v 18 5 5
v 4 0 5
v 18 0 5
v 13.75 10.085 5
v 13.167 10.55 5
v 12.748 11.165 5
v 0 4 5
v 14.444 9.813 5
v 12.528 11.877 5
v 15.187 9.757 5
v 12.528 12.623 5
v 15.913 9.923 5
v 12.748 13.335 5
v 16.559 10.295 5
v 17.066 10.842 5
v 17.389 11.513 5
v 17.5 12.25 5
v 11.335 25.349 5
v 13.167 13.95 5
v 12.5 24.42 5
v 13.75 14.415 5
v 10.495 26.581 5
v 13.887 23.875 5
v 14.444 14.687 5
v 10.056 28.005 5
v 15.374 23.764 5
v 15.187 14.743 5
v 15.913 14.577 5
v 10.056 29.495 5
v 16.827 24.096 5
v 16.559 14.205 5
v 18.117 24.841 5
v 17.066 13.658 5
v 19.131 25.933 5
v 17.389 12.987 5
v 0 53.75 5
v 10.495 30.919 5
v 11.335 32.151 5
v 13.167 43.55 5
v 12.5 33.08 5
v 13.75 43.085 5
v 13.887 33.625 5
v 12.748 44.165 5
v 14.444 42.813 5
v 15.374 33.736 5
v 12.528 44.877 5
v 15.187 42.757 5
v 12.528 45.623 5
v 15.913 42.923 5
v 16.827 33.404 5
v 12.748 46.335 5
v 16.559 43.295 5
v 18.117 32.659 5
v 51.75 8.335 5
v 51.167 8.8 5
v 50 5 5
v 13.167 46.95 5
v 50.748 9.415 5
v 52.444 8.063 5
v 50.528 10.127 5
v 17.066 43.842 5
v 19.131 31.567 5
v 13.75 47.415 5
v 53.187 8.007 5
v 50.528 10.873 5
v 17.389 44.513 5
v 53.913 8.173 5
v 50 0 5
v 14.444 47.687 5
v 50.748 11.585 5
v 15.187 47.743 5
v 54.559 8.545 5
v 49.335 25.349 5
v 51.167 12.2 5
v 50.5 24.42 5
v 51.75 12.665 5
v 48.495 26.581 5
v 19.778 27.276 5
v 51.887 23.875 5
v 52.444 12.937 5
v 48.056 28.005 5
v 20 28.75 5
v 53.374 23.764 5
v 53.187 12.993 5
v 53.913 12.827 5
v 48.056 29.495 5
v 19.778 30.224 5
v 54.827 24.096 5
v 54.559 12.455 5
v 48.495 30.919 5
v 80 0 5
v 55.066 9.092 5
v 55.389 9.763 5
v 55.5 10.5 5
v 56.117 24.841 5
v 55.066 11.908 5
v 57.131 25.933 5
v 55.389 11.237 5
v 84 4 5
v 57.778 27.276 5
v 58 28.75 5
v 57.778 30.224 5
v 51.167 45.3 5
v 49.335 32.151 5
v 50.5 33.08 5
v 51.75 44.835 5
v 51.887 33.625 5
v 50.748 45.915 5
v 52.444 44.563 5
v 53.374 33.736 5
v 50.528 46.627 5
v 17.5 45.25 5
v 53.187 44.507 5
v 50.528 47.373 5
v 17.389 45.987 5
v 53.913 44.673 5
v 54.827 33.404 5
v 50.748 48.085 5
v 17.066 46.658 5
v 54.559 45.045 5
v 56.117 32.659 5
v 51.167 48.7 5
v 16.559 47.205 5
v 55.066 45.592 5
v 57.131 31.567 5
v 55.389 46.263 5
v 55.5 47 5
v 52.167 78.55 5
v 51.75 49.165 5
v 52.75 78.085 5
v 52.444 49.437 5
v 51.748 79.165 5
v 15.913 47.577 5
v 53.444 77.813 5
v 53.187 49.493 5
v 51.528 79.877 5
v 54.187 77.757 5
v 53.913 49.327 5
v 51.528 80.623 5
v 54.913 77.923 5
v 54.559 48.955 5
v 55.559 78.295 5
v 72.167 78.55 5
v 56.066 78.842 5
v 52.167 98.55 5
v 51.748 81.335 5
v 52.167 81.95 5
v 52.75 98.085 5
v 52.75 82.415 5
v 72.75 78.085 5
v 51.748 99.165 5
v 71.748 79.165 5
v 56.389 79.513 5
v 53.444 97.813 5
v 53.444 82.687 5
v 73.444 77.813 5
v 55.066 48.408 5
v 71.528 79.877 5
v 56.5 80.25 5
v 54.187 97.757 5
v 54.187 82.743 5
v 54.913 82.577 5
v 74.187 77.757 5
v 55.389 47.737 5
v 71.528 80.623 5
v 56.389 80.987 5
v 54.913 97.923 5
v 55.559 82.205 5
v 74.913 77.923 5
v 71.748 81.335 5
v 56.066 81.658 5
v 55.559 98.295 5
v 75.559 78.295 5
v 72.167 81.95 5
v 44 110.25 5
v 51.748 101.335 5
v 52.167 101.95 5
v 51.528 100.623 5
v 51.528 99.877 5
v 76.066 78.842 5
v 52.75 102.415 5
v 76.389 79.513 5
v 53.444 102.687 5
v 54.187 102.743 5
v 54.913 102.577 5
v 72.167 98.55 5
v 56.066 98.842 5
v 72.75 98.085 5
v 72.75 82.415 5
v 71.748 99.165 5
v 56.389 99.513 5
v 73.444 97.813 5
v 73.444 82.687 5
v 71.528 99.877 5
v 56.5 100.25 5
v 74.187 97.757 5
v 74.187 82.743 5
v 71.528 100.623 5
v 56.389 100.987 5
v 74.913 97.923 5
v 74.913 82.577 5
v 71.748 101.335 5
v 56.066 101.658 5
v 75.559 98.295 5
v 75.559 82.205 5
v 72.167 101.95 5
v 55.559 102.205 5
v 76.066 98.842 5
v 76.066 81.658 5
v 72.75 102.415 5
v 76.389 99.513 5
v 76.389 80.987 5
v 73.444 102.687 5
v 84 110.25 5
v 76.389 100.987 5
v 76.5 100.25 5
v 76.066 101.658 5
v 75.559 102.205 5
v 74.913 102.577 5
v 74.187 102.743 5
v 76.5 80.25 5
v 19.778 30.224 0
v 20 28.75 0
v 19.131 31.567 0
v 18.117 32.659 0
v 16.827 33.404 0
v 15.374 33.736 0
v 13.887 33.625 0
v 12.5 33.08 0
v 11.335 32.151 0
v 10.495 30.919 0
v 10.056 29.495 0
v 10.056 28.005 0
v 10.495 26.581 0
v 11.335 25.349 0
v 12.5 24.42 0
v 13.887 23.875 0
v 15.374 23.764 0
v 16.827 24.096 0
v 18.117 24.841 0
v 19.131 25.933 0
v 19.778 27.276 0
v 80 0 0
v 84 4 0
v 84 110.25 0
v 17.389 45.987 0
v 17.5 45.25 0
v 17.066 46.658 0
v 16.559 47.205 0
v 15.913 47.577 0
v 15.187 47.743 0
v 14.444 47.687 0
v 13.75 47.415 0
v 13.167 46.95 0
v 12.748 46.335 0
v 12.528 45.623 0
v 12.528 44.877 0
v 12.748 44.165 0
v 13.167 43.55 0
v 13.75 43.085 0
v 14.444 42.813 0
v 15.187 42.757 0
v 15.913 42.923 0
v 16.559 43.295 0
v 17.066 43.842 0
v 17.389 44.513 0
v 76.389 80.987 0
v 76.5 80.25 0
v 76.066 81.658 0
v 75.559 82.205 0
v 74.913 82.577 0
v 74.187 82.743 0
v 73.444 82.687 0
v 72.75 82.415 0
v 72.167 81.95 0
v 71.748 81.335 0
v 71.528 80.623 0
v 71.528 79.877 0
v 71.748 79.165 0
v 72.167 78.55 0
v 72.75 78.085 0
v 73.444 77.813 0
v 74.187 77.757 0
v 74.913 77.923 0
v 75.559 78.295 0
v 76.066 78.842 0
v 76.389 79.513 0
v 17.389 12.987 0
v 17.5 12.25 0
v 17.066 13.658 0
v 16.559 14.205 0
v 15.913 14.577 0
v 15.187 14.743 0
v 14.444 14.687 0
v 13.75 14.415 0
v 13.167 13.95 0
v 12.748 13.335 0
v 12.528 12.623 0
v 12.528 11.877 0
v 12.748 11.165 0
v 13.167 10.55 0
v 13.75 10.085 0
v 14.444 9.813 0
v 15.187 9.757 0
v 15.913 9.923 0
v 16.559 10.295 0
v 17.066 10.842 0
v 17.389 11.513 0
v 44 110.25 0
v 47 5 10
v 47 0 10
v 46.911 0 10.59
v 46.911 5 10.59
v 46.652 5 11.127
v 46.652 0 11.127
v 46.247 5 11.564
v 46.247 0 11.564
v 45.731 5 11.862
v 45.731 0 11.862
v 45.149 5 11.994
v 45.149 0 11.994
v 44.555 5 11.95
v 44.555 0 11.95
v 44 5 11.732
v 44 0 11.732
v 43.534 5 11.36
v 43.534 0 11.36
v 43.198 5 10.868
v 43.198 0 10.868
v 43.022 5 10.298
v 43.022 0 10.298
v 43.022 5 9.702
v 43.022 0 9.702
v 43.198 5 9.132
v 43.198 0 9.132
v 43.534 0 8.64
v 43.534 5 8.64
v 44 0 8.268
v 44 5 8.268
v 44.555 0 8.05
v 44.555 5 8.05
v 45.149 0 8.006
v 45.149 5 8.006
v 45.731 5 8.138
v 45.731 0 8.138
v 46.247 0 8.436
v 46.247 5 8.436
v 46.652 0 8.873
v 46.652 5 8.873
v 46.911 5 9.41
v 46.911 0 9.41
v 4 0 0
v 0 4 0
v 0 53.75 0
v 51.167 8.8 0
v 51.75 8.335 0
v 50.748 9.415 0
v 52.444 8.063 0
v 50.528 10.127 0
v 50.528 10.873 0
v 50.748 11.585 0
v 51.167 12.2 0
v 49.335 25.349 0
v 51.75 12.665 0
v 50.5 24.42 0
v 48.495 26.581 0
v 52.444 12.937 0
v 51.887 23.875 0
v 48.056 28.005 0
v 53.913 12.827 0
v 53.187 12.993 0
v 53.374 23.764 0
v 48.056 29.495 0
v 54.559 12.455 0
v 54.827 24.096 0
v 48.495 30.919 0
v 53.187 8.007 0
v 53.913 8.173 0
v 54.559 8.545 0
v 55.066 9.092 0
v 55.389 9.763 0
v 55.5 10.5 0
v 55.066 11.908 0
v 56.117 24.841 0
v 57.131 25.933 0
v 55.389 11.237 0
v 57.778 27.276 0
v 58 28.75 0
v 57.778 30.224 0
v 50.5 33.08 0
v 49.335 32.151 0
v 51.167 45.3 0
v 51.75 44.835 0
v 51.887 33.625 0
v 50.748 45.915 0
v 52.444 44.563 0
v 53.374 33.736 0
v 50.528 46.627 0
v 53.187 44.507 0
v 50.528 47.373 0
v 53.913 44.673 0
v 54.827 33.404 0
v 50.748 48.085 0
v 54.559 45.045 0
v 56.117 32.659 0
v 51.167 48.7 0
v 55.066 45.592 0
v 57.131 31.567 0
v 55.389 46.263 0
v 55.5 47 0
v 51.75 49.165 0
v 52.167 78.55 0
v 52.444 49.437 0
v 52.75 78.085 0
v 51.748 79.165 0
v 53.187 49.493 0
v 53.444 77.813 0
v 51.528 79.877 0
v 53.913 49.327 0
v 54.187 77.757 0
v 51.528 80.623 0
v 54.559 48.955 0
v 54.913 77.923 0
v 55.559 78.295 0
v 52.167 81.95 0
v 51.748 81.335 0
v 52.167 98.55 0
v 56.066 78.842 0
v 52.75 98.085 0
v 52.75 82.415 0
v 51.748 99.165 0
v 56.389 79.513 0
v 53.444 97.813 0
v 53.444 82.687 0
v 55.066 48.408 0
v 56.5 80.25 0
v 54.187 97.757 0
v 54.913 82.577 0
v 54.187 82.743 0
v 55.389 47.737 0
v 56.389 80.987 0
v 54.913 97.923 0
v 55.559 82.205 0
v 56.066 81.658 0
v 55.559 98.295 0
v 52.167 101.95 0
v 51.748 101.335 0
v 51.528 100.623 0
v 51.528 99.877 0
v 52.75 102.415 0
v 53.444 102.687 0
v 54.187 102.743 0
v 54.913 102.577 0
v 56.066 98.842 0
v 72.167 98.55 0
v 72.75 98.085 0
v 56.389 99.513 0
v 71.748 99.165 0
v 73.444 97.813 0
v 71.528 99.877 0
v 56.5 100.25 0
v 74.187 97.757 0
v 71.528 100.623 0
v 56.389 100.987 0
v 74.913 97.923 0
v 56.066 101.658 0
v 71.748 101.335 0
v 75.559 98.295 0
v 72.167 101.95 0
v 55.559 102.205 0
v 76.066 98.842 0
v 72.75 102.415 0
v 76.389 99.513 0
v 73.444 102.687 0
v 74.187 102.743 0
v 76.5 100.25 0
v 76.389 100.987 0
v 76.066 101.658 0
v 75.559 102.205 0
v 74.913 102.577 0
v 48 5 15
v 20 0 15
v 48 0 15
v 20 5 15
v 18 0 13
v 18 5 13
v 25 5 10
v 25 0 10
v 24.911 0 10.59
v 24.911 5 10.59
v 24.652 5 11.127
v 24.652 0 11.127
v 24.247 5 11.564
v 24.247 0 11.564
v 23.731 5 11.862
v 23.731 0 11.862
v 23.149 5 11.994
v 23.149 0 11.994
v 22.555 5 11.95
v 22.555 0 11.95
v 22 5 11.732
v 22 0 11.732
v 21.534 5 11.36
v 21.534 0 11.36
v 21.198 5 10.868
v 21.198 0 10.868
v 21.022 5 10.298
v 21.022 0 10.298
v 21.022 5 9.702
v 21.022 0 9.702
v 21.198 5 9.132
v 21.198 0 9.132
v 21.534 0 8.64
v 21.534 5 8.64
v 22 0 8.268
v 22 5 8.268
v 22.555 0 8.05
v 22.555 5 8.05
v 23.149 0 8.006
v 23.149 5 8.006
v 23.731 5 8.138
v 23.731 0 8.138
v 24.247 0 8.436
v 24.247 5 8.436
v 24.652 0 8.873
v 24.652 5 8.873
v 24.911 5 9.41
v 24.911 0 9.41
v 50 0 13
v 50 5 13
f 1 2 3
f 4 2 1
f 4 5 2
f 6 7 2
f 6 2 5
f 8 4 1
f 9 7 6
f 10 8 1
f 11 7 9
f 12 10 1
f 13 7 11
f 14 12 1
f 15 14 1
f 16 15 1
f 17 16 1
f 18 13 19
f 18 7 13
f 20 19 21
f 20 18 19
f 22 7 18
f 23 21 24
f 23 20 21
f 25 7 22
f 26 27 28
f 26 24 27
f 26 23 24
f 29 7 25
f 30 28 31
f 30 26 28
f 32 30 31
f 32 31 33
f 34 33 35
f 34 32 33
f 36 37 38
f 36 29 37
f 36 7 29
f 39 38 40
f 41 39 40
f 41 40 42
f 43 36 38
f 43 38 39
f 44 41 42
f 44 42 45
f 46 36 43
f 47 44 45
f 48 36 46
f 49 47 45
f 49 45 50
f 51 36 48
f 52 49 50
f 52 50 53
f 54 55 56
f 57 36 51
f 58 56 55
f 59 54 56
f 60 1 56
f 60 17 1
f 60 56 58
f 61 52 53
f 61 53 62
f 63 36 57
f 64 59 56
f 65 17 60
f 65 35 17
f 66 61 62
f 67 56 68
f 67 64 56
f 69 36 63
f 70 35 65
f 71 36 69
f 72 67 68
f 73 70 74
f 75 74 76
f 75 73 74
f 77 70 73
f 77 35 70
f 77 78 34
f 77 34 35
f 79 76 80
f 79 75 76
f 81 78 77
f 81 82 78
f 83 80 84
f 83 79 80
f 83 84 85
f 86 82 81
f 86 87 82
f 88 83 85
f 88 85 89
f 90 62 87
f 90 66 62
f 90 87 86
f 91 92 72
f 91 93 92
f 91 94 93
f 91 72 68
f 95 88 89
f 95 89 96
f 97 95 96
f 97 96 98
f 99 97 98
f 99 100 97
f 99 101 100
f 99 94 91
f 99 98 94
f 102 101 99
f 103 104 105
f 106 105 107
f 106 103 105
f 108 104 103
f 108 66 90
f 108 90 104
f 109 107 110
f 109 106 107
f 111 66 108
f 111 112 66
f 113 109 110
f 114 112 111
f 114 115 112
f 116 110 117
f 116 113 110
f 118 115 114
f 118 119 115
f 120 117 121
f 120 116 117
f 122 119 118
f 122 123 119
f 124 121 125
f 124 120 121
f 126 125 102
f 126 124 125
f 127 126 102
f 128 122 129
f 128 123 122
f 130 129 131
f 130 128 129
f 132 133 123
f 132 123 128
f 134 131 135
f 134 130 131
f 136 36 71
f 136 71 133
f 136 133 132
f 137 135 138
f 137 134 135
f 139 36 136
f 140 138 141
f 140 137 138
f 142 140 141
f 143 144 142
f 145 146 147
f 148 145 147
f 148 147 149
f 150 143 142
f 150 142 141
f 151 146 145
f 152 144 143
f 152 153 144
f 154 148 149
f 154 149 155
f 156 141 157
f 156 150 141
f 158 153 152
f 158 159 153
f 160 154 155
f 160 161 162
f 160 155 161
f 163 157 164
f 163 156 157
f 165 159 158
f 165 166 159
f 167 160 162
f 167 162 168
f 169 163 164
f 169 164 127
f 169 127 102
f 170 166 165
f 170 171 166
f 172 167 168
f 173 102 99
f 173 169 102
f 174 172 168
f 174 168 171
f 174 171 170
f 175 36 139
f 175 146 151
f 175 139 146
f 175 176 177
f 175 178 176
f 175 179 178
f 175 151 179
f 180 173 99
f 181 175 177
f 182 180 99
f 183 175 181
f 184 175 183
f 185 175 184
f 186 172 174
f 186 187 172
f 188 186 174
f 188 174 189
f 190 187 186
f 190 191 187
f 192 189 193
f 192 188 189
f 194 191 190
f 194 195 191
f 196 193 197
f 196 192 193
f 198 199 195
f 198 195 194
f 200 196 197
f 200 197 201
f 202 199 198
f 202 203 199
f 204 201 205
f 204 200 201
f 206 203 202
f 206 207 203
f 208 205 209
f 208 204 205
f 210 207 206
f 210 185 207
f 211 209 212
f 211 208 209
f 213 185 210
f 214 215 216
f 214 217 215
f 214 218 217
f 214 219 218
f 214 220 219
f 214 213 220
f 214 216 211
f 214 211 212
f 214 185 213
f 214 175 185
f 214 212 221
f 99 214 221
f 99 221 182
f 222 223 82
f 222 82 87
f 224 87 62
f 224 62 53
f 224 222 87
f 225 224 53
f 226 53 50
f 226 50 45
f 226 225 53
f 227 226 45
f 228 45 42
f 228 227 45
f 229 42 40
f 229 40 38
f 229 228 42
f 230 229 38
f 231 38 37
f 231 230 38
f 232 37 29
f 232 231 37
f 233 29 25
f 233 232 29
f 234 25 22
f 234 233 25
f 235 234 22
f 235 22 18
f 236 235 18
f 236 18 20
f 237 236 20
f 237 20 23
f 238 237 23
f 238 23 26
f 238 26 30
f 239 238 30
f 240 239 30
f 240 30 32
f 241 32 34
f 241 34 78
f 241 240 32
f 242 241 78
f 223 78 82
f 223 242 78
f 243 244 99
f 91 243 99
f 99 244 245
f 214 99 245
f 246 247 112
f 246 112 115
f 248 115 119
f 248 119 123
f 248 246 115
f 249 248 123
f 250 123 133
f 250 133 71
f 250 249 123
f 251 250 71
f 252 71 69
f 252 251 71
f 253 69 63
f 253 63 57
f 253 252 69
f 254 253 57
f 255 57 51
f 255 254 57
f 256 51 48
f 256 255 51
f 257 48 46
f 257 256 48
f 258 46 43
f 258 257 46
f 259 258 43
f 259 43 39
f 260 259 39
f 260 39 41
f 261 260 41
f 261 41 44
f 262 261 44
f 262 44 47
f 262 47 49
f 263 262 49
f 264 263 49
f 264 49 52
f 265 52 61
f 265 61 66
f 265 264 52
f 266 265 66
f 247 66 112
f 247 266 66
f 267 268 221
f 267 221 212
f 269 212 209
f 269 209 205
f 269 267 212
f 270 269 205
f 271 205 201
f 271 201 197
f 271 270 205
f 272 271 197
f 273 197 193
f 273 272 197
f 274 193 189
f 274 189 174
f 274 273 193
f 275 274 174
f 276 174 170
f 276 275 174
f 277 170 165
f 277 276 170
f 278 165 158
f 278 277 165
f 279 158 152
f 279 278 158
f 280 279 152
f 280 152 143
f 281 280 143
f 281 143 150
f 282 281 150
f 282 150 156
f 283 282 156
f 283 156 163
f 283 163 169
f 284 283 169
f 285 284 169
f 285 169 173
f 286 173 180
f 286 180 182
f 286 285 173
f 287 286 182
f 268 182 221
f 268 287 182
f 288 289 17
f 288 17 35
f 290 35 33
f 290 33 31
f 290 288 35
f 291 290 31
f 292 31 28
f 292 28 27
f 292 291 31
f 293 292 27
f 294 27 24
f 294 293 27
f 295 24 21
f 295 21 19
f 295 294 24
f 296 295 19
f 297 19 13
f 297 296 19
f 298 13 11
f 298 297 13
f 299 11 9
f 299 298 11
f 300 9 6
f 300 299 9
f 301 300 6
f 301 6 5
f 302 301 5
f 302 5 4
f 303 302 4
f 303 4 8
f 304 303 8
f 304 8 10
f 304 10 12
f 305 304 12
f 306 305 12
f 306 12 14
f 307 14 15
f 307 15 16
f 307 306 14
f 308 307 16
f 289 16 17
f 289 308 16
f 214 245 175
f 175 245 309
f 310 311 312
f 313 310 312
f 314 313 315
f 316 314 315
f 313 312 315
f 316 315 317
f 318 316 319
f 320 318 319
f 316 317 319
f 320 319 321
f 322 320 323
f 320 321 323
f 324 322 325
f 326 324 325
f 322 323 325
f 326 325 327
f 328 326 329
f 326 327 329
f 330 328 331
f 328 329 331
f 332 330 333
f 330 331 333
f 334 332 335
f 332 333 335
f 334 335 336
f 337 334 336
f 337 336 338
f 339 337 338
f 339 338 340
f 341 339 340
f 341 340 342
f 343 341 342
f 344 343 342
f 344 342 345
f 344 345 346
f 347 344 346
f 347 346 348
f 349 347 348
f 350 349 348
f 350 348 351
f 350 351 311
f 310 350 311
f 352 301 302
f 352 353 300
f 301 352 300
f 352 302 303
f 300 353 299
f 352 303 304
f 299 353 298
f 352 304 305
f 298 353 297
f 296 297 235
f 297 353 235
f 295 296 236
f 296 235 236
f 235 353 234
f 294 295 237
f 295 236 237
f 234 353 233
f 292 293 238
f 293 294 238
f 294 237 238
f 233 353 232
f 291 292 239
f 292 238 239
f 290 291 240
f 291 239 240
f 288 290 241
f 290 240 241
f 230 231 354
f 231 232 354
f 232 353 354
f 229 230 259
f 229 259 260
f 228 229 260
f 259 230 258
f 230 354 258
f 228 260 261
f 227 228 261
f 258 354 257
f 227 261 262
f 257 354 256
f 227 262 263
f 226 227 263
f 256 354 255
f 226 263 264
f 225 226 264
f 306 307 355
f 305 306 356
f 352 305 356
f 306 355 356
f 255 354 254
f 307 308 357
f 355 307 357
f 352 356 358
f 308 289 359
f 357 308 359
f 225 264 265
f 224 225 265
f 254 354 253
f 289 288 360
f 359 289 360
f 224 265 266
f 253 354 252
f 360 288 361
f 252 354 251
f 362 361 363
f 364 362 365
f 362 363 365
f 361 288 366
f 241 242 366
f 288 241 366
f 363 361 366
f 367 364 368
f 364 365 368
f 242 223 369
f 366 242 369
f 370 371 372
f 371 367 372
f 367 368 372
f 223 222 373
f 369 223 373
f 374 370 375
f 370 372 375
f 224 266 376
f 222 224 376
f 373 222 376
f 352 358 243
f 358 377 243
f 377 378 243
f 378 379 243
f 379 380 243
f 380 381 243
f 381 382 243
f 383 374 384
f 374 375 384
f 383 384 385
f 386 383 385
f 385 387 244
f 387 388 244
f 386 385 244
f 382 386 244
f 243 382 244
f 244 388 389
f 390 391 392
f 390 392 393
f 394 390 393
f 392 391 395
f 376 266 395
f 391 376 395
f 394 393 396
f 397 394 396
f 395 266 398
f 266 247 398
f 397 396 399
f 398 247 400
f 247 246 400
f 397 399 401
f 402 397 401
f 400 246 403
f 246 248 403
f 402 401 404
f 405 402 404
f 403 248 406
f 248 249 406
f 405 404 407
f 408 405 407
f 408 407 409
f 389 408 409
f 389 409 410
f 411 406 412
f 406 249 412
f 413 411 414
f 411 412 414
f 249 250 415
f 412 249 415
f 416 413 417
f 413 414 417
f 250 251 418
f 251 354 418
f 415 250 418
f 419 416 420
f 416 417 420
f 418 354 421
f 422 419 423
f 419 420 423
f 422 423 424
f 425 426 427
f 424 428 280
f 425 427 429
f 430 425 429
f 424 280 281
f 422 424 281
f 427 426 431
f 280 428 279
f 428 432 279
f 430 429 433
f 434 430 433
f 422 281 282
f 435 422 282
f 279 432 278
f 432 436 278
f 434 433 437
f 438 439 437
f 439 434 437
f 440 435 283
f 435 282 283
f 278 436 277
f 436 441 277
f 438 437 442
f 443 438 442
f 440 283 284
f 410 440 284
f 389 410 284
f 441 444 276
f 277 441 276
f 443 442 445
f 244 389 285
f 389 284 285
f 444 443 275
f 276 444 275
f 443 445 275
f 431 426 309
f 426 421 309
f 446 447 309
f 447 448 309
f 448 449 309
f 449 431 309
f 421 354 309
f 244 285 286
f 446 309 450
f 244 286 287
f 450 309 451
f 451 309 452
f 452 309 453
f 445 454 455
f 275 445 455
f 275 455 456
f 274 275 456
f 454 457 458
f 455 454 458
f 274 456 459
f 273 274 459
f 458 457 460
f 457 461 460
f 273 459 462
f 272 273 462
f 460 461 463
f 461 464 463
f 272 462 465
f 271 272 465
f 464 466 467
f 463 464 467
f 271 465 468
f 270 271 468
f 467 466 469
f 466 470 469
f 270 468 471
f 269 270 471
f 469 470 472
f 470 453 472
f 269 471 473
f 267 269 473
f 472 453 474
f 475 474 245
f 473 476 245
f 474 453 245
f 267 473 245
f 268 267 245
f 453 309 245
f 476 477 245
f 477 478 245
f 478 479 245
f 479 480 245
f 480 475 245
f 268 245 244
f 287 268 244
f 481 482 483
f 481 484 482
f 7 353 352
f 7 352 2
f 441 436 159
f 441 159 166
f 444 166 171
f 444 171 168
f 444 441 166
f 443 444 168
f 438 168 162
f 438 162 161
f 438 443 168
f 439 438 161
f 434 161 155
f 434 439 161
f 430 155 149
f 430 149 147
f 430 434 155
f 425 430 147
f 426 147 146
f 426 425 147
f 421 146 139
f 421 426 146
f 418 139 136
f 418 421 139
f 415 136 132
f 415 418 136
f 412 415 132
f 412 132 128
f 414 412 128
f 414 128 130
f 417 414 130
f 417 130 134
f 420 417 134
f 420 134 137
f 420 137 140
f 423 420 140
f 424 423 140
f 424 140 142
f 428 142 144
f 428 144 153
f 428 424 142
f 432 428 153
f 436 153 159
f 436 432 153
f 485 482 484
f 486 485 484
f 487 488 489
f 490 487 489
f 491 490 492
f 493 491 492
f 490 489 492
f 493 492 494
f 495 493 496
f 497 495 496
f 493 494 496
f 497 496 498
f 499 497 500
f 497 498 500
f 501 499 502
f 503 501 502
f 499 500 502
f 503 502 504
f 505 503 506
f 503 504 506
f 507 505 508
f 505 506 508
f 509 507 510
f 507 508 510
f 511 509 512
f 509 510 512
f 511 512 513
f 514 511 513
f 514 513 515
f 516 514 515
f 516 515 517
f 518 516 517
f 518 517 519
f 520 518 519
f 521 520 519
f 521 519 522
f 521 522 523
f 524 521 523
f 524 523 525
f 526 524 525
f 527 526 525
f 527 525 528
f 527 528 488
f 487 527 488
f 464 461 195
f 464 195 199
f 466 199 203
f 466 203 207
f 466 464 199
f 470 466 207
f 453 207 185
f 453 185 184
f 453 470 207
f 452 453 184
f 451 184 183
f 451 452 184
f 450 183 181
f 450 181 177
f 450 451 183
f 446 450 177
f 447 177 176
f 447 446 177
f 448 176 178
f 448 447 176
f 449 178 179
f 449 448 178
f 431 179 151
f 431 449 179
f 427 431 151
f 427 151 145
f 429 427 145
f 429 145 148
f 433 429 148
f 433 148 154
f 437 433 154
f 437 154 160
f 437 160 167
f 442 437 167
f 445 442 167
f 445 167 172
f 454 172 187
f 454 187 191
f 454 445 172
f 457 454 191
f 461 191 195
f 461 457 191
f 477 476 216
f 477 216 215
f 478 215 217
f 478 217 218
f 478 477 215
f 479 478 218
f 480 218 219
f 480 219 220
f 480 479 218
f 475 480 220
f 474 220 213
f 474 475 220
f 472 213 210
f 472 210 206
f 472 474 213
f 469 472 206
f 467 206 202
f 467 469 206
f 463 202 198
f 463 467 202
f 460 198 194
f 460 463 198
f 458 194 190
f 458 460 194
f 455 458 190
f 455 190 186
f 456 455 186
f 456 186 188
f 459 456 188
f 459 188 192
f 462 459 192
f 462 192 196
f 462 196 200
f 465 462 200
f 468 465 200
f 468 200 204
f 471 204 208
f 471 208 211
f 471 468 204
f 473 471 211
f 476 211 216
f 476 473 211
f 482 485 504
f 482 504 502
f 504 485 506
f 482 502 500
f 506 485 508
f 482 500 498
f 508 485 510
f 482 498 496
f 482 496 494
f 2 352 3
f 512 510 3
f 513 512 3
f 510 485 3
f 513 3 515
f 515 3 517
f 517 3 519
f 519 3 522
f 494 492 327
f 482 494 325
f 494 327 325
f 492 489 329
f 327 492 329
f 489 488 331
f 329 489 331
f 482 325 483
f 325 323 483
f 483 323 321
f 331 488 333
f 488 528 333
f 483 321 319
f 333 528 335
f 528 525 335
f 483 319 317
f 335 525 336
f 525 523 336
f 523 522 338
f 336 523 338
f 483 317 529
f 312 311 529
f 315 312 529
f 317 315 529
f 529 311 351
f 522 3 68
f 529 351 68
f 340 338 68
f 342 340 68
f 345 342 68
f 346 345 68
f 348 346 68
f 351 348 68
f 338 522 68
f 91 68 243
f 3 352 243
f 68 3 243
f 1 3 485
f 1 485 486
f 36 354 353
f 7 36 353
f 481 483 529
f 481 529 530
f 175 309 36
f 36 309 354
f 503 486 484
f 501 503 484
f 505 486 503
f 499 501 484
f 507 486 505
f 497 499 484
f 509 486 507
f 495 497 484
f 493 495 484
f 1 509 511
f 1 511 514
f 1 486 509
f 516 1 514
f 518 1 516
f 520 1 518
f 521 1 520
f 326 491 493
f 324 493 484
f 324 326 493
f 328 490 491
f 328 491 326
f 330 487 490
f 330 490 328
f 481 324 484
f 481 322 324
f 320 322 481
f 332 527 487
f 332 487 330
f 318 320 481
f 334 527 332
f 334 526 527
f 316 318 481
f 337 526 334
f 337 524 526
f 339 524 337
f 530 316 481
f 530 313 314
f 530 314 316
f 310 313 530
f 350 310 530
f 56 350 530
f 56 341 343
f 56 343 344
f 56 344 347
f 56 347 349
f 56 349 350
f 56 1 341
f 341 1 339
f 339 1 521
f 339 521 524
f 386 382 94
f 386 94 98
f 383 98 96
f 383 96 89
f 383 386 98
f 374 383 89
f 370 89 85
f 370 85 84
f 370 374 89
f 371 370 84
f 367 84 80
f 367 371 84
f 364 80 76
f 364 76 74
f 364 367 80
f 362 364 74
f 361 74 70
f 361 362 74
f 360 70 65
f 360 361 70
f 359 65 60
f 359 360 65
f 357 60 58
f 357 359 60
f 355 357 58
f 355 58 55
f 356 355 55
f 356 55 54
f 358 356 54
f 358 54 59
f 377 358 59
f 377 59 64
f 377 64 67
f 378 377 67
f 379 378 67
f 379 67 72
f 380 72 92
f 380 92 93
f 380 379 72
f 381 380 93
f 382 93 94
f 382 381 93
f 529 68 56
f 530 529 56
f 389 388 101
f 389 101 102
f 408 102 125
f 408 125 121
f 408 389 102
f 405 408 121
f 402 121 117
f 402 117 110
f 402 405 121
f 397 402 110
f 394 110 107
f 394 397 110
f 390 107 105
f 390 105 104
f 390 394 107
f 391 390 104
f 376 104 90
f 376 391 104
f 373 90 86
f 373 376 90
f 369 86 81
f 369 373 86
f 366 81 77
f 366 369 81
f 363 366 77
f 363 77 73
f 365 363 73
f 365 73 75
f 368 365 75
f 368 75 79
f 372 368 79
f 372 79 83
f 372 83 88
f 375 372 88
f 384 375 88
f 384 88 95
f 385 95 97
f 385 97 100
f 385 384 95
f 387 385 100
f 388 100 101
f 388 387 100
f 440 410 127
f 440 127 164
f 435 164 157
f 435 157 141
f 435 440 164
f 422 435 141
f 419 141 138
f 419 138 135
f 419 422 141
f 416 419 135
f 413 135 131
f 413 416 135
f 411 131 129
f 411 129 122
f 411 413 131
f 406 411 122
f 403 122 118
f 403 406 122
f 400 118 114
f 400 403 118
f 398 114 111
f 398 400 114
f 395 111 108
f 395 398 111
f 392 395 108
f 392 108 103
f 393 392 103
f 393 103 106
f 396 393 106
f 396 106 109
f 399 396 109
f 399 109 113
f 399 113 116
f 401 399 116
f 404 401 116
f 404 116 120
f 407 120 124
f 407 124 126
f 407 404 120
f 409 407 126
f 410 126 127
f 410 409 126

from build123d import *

# Parameters (mm, degrees)
SKETCH_R        = 2.5
SKETCH_R_2      = 5
PAD_DEPTH       = 5
CHAMFER_SIZE    = 4
SKETCH001_W     = 32
SKETCH001_H     = 5
PAD001_DEPTH    = 10
SKETCH002_R     = 2
POCKET_DEPTH    = 110.251
CHAMFER001_SIZE = 2


with BuildPart() as part:
    # Sketch → Pad (new body)
    with BuildSketch(Plane.XY):
        Polygon((84, 110.25), (44, 110.25), (0, 53.75), (0, 0), (84, 0), align=None)
        with Locations((15, 45.25)):
            Circle(SKETCH_R, mode=Mode.SUBTRACT)
        with Locations((15, 12.25)):
            Circle(SKETCH_R, mode=Mode.SUBTRACT)
        with Locations((15, 28.75)):
            Circle(SKETCH_R_2, mode=Mode.SUBTRACT)
        with Locations((53, 47)):
            Circle(SKETCH_R, mode=Mode.SUBTRACT)
        with Locations((53, 28.75)):
            Circle(SKETCH_R_2, mode=Mode.SUBTRACT)
        with Locations((53, 10.5)):
            Circle(SKETCH_R, mode=Mode.SUBTRACT)
        with Locations((54, 80.25)):
            Circle(SKETCH_R, mode=Mode.SUBTRACT)
        with Locations((74, 80.25)):
            Circle(SKETCH_R, mode=Mode.SUBTRACT)
        with Locations((54, 100.25)):
            Circle(SKETCH_R, mode=Mode.SUBTRACT)
        with Locations((74, 100.25)):
            Circle(SKETCH_R, mode=Mode.SUBTRACT)
    extrude(amount=PAD_DEPTH)

    # Chamfer
    chamfer_edges = [part.edges().sort_by_distance(p)[0] for p in [
        (0, 0, 2.5),
        (84, 0, 2.5),
    ]]
    chamfer(chamfer_edges, length=CHAMFER_SIZE)

    # Sketch001 (on Face5 of Chamfer) → Pad001 (join)
    with BuildSketch(Plane.XY.offset(5)):
        with Locations((34, 2.5)):
            Rectangle(SKETCH001_W, SKETCH001_H)
    extrude(amount=PAD001_DEPTH)

    # Sketch002 (on Face23 of Pad001) → Pocket (cut, through all)
    with BuildSketch(Plane.XZ):
        with Locations((23, 10)):
            Circle(SKETCH002_R)
        with Locations((45, 10)):
            Circle(SKETCH002_R)
    extrude(amount=-POCKET_DEPTH, mode=Mode.SUBTRACT)

    # Chamfer001
    chamfer001_edges = [part.edges().sort_by_distance(p)[0] for p in [
        (18, 2.5, 15),
        (50, 2.5, 15),
    ]]
    chamfer(chamfer001_edges, length=CHAMFER001_SIZE)


solid = part.part
